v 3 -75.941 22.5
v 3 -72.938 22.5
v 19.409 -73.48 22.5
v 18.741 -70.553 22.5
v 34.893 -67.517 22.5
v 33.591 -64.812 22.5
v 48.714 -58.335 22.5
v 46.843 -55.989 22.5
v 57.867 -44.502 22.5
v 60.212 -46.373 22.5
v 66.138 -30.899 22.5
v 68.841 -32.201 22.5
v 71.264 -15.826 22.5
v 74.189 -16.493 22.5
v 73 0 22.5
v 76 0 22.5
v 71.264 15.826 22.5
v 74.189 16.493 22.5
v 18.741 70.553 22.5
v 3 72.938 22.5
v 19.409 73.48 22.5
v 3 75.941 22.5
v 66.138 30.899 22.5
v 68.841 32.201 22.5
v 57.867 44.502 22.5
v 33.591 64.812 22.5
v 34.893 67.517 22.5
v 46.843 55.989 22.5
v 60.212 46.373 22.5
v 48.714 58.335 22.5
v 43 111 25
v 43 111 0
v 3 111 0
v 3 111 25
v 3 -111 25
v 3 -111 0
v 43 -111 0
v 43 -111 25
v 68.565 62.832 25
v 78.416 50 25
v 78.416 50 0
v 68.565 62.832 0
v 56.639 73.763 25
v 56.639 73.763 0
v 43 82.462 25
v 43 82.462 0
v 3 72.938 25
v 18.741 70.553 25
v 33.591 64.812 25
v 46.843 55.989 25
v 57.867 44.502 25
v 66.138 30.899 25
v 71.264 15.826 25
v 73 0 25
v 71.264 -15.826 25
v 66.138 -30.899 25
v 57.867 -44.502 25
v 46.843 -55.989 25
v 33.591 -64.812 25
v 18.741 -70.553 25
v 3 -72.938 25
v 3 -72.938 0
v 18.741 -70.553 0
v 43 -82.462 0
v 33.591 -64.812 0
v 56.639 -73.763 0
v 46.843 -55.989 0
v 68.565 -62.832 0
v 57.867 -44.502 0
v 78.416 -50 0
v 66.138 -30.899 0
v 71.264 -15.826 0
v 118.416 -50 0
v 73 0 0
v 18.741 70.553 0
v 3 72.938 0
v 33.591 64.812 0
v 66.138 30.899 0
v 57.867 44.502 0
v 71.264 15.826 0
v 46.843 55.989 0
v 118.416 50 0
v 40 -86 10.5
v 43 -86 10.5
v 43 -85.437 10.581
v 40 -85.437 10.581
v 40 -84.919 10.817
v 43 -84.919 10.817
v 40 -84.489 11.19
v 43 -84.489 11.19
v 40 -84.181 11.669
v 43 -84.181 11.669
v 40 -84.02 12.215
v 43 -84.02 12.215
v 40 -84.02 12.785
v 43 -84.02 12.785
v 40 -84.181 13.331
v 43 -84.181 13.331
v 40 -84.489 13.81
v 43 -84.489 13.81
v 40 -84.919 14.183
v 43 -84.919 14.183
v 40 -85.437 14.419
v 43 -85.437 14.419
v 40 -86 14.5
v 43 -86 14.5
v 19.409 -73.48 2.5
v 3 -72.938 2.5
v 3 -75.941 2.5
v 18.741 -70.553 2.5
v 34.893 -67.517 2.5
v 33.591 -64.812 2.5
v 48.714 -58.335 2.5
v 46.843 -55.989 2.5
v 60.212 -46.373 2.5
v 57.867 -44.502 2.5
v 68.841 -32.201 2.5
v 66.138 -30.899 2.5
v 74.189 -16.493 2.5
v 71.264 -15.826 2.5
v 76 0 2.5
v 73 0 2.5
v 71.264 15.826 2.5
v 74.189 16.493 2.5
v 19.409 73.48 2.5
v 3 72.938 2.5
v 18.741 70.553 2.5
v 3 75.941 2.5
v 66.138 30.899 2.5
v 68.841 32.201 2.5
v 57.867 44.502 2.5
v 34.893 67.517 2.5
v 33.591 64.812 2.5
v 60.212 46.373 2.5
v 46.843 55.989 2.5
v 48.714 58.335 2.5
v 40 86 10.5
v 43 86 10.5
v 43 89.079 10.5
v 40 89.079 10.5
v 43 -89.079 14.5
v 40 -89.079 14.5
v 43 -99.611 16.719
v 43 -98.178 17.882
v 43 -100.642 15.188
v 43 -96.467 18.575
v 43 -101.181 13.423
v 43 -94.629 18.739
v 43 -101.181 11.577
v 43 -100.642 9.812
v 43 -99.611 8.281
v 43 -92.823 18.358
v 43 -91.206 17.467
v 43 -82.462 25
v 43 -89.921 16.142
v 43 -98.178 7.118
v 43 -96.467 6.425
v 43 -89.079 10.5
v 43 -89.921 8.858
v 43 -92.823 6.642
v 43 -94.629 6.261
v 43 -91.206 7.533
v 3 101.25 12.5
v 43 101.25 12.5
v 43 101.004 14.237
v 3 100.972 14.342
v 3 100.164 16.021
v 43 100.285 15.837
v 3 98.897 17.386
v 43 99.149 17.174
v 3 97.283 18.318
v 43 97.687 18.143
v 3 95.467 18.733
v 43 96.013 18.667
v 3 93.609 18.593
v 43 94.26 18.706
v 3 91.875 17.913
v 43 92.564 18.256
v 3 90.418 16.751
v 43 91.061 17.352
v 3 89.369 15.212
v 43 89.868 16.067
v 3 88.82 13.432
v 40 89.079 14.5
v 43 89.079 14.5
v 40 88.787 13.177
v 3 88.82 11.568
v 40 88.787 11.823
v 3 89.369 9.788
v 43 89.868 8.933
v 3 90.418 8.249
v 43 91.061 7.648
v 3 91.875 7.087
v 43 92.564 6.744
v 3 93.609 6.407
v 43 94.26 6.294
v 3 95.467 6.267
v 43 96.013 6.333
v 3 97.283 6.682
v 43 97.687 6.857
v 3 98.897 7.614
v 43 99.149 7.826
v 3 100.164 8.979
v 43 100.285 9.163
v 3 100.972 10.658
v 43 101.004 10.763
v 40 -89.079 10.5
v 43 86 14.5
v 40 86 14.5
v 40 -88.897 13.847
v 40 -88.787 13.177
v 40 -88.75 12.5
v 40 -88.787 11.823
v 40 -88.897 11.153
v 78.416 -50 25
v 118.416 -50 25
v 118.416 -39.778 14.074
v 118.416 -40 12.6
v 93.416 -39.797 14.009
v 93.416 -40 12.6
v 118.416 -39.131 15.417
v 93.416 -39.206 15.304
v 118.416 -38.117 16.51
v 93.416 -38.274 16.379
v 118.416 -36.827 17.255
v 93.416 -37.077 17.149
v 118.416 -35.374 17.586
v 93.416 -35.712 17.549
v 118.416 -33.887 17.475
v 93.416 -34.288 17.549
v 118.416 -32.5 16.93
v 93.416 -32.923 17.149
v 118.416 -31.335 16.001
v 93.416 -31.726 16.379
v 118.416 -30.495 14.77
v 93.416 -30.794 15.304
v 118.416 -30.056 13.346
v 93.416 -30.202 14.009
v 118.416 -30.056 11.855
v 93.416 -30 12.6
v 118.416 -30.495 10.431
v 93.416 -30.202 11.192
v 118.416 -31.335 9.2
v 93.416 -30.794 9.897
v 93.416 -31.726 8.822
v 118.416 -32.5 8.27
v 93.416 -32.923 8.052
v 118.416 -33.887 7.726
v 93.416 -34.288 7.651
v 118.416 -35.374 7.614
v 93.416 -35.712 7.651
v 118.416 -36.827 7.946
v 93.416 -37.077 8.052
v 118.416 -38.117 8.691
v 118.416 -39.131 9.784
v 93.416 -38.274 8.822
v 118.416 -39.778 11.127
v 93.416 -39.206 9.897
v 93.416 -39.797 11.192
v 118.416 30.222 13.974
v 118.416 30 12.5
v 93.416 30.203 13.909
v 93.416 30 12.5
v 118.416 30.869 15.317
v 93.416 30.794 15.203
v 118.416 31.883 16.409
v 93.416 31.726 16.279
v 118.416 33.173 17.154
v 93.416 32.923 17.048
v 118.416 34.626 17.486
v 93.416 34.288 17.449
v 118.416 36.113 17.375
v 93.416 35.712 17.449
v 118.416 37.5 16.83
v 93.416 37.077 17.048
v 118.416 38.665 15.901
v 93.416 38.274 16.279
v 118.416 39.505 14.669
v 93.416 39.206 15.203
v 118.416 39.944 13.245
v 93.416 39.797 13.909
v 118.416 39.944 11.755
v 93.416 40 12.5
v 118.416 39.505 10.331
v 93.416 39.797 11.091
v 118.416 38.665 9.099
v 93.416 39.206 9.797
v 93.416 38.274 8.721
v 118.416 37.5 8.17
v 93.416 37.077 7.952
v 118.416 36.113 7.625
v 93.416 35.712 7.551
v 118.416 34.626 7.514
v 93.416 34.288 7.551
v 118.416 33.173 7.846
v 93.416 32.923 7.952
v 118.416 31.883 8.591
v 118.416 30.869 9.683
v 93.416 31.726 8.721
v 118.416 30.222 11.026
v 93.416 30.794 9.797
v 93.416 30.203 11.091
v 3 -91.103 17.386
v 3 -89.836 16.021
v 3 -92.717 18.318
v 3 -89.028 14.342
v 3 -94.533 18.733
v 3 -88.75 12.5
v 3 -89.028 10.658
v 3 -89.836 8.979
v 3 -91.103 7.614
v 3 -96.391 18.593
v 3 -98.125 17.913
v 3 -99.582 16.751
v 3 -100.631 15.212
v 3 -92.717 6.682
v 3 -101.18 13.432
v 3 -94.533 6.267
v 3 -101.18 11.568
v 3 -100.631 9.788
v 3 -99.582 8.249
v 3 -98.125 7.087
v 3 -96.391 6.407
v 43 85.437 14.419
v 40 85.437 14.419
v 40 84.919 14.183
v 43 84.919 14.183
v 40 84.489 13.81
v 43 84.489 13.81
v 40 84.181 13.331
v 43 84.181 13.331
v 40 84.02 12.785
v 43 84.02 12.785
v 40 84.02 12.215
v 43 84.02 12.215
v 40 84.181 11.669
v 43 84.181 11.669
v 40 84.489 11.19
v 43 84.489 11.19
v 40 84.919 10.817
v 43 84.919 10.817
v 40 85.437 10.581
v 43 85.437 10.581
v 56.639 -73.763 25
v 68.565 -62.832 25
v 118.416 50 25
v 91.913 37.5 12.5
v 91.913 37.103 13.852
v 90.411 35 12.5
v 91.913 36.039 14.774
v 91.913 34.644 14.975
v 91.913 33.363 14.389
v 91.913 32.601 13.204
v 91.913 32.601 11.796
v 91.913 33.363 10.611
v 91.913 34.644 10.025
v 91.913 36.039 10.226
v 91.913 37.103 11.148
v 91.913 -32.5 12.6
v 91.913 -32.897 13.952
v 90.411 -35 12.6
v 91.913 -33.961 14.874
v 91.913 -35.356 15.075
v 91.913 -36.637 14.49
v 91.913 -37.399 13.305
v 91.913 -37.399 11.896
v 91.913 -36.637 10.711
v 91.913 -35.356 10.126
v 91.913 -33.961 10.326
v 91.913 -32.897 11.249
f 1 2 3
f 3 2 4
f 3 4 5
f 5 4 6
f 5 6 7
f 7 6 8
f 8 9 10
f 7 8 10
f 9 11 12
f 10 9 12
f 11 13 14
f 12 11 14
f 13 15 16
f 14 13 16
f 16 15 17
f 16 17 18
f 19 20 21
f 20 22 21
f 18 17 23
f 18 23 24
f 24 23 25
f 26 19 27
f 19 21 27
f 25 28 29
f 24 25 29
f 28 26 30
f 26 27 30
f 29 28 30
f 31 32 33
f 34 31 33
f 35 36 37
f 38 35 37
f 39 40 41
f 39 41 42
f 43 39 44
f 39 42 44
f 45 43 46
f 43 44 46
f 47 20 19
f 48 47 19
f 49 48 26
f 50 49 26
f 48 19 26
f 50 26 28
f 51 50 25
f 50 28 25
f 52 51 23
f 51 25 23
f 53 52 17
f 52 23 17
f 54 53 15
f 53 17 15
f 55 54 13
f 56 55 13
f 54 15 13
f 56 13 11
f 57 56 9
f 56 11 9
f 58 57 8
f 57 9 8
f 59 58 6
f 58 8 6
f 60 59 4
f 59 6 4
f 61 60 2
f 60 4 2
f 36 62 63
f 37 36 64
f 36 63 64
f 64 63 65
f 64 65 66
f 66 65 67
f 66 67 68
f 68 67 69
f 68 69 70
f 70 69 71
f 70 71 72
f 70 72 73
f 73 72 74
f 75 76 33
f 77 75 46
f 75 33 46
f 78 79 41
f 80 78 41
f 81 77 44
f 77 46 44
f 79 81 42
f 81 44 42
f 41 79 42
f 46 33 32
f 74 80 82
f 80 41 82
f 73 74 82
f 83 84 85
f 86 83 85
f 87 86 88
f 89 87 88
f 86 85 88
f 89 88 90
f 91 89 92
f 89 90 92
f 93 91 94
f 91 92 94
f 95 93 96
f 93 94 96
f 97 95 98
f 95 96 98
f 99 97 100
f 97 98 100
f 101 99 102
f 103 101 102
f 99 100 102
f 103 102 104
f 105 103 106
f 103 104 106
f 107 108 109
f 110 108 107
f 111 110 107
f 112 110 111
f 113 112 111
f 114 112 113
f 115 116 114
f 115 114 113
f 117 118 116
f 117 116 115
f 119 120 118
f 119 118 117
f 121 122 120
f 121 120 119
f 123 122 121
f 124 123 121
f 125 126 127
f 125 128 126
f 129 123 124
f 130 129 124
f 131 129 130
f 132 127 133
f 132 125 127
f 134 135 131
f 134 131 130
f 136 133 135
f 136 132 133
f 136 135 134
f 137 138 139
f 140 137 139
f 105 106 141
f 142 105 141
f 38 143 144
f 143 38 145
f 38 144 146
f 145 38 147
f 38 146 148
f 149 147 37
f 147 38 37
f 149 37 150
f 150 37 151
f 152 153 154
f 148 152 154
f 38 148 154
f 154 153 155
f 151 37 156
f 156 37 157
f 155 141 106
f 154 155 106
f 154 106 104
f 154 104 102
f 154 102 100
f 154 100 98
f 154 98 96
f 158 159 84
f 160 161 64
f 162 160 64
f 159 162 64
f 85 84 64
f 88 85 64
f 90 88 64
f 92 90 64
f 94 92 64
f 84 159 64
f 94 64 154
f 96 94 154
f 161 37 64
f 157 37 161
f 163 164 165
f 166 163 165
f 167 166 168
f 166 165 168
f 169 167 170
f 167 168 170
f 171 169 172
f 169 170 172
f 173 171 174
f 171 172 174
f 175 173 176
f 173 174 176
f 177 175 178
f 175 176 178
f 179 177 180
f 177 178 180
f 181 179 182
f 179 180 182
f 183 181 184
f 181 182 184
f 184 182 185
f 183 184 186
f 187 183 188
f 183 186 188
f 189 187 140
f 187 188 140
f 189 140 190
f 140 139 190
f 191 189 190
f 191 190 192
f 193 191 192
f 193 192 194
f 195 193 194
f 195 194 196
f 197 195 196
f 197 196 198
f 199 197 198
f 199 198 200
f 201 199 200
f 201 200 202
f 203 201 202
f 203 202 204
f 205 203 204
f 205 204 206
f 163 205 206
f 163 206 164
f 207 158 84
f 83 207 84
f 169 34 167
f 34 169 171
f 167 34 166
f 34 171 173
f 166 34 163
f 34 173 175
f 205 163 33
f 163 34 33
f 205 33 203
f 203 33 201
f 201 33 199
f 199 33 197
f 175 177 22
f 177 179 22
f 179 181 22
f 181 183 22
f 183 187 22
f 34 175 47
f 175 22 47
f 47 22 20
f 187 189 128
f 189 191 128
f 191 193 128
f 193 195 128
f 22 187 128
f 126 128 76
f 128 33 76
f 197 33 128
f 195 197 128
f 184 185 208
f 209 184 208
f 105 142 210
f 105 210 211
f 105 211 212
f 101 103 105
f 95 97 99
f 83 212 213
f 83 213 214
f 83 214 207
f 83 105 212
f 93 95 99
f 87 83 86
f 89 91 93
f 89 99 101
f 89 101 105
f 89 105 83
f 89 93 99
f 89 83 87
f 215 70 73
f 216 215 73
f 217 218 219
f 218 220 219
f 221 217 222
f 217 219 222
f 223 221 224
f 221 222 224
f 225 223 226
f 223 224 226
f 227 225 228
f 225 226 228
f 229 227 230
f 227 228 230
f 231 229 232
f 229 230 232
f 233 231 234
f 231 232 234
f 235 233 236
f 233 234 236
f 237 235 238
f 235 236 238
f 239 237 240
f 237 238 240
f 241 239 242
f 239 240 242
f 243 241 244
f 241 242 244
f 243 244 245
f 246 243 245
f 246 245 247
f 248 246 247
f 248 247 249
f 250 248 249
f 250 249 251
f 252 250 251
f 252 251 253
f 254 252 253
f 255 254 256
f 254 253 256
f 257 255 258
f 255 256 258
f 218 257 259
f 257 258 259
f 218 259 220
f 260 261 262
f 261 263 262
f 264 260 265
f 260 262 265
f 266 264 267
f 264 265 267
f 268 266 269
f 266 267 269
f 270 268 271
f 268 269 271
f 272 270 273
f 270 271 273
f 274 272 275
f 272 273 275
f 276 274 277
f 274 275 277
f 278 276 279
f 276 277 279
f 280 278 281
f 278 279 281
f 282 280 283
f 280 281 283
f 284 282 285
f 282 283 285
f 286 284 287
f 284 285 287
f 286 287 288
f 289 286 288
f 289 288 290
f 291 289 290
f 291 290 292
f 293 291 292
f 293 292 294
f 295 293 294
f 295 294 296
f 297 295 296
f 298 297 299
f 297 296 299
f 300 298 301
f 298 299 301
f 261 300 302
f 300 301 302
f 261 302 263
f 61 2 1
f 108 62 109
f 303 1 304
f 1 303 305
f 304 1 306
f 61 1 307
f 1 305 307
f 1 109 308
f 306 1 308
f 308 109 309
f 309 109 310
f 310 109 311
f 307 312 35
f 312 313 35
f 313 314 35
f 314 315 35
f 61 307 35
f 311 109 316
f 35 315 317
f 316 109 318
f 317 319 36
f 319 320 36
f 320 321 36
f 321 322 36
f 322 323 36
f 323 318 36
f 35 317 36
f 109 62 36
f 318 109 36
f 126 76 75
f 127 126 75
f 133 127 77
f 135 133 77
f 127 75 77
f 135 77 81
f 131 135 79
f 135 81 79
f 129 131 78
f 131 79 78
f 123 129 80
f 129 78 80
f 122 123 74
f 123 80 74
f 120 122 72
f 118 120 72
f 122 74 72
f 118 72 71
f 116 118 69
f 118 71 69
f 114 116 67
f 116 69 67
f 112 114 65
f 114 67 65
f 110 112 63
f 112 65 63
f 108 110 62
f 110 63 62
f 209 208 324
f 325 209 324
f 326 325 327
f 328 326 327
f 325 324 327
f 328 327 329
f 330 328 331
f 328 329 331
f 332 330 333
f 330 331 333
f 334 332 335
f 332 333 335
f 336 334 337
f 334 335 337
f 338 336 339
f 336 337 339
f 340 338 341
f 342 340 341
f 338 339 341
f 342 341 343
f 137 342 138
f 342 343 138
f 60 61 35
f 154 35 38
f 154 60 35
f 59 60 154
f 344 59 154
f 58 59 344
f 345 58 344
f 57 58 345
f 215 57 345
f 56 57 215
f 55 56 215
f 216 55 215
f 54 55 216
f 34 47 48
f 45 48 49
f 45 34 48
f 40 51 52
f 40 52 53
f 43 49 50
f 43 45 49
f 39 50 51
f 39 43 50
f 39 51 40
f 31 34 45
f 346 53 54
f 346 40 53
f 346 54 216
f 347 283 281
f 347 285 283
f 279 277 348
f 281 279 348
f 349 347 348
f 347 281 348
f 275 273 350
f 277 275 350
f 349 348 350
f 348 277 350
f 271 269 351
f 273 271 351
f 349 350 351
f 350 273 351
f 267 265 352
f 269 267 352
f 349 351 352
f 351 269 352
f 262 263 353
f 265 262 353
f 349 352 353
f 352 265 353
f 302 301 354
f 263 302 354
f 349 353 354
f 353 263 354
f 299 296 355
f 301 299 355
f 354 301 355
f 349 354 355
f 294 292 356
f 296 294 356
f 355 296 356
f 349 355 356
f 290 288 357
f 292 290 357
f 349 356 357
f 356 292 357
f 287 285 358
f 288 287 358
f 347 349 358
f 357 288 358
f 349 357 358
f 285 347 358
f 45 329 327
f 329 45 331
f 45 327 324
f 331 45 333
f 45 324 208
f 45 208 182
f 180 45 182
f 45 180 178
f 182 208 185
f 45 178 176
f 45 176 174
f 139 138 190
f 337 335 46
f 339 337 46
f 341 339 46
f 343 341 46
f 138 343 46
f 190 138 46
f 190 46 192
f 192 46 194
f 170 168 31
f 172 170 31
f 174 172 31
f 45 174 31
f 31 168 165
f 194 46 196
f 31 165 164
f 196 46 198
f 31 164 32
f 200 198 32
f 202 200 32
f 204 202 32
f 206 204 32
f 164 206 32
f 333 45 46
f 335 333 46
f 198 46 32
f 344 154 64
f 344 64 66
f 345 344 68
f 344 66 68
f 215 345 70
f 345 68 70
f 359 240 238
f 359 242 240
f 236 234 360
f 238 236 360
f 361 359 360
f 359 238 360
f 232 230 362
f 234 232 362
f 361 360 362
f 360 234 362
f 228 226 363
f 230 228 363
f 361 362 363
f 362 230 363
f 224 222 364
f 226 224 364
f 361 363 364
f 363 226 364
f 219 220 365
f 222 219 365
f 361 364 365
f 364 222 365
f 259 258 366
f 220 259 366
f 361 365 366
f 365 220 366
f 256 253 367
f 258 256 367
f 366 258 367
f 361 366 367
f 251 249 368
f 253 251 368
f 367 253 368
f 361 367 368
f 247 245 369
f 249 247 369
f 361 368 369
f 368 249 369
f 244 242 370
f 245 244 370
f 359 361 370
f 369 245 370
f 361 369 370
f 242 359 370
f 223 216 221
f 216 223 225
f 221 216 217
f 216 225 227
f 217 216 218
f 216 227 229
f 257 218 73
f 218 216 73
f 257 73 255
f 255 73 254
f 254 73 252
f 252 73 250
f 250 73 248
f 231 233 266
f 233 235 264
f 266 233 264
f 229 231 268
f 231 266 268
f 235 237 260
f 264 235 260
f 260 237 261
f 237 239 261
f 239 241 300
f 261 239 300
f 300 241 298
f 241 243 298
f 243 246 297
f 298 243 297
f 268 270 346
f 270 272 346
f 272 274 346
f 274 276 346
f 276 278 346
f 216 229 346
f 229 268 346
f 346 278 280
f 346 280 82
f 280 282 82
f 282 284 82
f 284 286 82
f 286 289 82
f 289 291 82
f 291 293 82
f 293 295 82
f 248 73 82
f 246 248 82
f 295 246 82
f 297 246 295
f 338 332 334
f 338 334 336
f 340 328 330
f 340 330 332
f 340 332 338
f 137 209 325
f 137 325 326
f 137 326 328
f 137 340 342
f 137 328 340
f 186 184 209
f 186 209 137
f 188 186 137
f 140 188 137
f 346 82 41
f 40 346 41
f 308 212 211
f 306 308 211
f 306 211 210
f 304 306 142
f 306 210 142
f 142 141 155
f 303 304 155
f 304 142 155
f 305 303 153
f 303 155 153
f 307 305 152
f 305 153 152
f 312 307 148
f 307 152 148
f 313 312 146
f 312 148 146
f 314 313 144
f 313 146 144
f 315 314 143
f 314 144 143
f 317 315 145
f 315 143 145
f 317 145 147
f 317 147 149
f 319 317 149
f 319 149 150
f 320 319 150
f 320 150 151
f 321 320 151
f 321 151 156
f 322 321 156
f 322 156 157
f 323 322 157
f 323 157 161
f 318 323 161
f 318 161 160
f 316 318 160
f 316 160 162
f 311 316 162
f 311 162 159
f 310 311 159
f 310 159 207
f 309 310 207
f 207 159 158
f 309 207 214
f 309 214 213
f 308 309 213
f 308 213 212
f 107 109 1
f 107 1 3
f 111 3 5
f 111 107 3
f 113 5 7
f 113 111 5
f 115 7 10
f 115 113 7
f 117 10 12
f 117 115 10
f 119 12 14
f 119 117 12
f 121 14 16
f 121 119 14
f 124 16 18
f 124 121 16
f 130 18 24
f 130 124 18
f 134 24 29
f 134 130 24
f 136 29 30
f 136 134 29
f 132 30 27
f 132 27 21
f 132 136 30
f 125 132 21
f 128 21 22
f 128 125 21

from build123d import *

# Parameters (mm, degrees)
BOSS_EXTRUDE1_DEPTH        = 25
F_10_0MM_DOWEL_HOLE1_D     = 10
F_10_0MM_DOWEL_HOLE1_DEPTH = 25
F_10_0MM_DOWEL_HOLE1_TIP   = 3.004303095
SKETCH2_R                  = 6.25
CUT_EXTRUDE2_DEPTH         = 137.504603006
CUT_EXTRUDE3_DEPTH         = 3
CUT_EXTRUDE4_START         = 2.5
CUT_EXTRUDE4_DEPTH         = 20


with BuildPart() as part:
    # Sketch1 → Boss-Extrude1 (new body)
    with BuildSketch(Plane.XY):
        with BuildLine():
            ThreePointArc((3, 72.938330115), (73, 0), (3, -72.938330115))
            Line((3, -72.938330115), (3, -111))
            Line((3, -111), (43, -111))
            Line((43, -111), (43, -82.462112512))
            ThreePointArc((43, -82.462112512), (62.840128265, -68.557408642), (78.41555968, -50))
            Line((78.41555968, -50), (118.41555968, -50))
            Line((118.41555968, -50), (118.41555968, 50))
            Line((118.41555968, 50), (78.41555968, 50))
            ThreePointArc((78.41555968, 50), (62.840128265, 68.557408642), (43, 82.462112512))
            Line((43, 82.462112512), (43, 111))
            Line((43, 111), (3, 111))
            Line((3, 111), (3, 72.938330115))
        make_face()
    extrude(amount=BOSS_EXTRUDE1_DEPTH)

    # Ø10.0mm Dowel Hole1
    with Locations(Plane(origin=(118.41555968, 35, 12.5), x_dir=(0, 1, 0), z_dir=(1, 0, 0))):
        with Locations((0, 0), (-69.999928039, 0.100371864)):
            Hole(F_10_0MM_DOWEL_HOLE1_D / 2, depth=F_10_0MM_DOWEL_HOLE1_DEPTH)
            with Locations((0, 0, -(F_10_0MM_DOWEL_HOLE1_DEPTH + F_10_0MM_DOWEL_HOLE1_TIP / 2))):  # 118° drill point
                Cone(0, F_10_0MM_DOWEL_HOLE1_D / 2, F_10_0MM_DOWEL_HOLE1_TIP, mode=Mode.SUBTRACT)

    # Sketch2 → Cut-Extrude2 (cut, through all)
    with BuildSketch(Plane(origin=(43, 0, 0), x_dir=(0, 0, -1), z_dir=(1, 0, 0))):
        with Locations((-12.5, -95)):
            Circle(SKETCH2_R)
        with Locations((-12.5, 95)):
            Circle(SKETCH2_R)
    extrude(amount=-CUT_EXTRUDE2_DEPTH, mode=Mode.SUBTRACT)

    # Sketch2<4> → Cut-Extrude3 (cut)
    with BuildSketch(Plane(origin=(43, 0, 0), x_dir=(0, 0, -1), z_dir=(1, 0, 0))):
        with BuildLine():
            ThreePointArc((-10.5, -86), (-12.5, -84), (-14.5, -86))
            Line((-14.5, -86), (-14.5, -89.078640359))
            ThreePointArc((-14.5, -89.078640359), (-12.5, -88.75), (-10.5, -89.078640359))
            Line((-10.5, -89.078640359), (-10.5, -86))
        make_face()
        with BuildLine():
            ThreePointArc((-14.5, 86), (-12.5, 84), (-10.5, 86))
            Line((-10.5, 86), (-10.5, 89.078640359))
            ThreePointArc((-10.5, 89.078640359), (-12.5, 88.75), (-14.5, 89.078640359))
            Line((-14.5, 89.078640359), (-14.5, 86))
        make_face()
    extrude(amount=-CUT_EXTRUDE3_DEPTH, mode=Mode.SUBTRACT)

    # Sketch1<3> → Cut-Extrude4 (cut)
    with BuildSketch(Plane.XY.offset(CUT_EXTRUDE4_START)):
        with BuildLine():
            ThreePointArc((3, 72.938330115), (73, 0), (3, -72.938330115))
            Line((3, -72.938330115), (3, -75.940766391))
            ThreePointArc((3, -75.940766391), (76, 0), (3, 75.940766391))
            Line((3, 75.940766391), (3, 72.938330115))
        make_face()
    extrude(amount=CUT_EXTRUDE4_DEPTH, mode=Mode.SUBTRACT)


solid = part.part
